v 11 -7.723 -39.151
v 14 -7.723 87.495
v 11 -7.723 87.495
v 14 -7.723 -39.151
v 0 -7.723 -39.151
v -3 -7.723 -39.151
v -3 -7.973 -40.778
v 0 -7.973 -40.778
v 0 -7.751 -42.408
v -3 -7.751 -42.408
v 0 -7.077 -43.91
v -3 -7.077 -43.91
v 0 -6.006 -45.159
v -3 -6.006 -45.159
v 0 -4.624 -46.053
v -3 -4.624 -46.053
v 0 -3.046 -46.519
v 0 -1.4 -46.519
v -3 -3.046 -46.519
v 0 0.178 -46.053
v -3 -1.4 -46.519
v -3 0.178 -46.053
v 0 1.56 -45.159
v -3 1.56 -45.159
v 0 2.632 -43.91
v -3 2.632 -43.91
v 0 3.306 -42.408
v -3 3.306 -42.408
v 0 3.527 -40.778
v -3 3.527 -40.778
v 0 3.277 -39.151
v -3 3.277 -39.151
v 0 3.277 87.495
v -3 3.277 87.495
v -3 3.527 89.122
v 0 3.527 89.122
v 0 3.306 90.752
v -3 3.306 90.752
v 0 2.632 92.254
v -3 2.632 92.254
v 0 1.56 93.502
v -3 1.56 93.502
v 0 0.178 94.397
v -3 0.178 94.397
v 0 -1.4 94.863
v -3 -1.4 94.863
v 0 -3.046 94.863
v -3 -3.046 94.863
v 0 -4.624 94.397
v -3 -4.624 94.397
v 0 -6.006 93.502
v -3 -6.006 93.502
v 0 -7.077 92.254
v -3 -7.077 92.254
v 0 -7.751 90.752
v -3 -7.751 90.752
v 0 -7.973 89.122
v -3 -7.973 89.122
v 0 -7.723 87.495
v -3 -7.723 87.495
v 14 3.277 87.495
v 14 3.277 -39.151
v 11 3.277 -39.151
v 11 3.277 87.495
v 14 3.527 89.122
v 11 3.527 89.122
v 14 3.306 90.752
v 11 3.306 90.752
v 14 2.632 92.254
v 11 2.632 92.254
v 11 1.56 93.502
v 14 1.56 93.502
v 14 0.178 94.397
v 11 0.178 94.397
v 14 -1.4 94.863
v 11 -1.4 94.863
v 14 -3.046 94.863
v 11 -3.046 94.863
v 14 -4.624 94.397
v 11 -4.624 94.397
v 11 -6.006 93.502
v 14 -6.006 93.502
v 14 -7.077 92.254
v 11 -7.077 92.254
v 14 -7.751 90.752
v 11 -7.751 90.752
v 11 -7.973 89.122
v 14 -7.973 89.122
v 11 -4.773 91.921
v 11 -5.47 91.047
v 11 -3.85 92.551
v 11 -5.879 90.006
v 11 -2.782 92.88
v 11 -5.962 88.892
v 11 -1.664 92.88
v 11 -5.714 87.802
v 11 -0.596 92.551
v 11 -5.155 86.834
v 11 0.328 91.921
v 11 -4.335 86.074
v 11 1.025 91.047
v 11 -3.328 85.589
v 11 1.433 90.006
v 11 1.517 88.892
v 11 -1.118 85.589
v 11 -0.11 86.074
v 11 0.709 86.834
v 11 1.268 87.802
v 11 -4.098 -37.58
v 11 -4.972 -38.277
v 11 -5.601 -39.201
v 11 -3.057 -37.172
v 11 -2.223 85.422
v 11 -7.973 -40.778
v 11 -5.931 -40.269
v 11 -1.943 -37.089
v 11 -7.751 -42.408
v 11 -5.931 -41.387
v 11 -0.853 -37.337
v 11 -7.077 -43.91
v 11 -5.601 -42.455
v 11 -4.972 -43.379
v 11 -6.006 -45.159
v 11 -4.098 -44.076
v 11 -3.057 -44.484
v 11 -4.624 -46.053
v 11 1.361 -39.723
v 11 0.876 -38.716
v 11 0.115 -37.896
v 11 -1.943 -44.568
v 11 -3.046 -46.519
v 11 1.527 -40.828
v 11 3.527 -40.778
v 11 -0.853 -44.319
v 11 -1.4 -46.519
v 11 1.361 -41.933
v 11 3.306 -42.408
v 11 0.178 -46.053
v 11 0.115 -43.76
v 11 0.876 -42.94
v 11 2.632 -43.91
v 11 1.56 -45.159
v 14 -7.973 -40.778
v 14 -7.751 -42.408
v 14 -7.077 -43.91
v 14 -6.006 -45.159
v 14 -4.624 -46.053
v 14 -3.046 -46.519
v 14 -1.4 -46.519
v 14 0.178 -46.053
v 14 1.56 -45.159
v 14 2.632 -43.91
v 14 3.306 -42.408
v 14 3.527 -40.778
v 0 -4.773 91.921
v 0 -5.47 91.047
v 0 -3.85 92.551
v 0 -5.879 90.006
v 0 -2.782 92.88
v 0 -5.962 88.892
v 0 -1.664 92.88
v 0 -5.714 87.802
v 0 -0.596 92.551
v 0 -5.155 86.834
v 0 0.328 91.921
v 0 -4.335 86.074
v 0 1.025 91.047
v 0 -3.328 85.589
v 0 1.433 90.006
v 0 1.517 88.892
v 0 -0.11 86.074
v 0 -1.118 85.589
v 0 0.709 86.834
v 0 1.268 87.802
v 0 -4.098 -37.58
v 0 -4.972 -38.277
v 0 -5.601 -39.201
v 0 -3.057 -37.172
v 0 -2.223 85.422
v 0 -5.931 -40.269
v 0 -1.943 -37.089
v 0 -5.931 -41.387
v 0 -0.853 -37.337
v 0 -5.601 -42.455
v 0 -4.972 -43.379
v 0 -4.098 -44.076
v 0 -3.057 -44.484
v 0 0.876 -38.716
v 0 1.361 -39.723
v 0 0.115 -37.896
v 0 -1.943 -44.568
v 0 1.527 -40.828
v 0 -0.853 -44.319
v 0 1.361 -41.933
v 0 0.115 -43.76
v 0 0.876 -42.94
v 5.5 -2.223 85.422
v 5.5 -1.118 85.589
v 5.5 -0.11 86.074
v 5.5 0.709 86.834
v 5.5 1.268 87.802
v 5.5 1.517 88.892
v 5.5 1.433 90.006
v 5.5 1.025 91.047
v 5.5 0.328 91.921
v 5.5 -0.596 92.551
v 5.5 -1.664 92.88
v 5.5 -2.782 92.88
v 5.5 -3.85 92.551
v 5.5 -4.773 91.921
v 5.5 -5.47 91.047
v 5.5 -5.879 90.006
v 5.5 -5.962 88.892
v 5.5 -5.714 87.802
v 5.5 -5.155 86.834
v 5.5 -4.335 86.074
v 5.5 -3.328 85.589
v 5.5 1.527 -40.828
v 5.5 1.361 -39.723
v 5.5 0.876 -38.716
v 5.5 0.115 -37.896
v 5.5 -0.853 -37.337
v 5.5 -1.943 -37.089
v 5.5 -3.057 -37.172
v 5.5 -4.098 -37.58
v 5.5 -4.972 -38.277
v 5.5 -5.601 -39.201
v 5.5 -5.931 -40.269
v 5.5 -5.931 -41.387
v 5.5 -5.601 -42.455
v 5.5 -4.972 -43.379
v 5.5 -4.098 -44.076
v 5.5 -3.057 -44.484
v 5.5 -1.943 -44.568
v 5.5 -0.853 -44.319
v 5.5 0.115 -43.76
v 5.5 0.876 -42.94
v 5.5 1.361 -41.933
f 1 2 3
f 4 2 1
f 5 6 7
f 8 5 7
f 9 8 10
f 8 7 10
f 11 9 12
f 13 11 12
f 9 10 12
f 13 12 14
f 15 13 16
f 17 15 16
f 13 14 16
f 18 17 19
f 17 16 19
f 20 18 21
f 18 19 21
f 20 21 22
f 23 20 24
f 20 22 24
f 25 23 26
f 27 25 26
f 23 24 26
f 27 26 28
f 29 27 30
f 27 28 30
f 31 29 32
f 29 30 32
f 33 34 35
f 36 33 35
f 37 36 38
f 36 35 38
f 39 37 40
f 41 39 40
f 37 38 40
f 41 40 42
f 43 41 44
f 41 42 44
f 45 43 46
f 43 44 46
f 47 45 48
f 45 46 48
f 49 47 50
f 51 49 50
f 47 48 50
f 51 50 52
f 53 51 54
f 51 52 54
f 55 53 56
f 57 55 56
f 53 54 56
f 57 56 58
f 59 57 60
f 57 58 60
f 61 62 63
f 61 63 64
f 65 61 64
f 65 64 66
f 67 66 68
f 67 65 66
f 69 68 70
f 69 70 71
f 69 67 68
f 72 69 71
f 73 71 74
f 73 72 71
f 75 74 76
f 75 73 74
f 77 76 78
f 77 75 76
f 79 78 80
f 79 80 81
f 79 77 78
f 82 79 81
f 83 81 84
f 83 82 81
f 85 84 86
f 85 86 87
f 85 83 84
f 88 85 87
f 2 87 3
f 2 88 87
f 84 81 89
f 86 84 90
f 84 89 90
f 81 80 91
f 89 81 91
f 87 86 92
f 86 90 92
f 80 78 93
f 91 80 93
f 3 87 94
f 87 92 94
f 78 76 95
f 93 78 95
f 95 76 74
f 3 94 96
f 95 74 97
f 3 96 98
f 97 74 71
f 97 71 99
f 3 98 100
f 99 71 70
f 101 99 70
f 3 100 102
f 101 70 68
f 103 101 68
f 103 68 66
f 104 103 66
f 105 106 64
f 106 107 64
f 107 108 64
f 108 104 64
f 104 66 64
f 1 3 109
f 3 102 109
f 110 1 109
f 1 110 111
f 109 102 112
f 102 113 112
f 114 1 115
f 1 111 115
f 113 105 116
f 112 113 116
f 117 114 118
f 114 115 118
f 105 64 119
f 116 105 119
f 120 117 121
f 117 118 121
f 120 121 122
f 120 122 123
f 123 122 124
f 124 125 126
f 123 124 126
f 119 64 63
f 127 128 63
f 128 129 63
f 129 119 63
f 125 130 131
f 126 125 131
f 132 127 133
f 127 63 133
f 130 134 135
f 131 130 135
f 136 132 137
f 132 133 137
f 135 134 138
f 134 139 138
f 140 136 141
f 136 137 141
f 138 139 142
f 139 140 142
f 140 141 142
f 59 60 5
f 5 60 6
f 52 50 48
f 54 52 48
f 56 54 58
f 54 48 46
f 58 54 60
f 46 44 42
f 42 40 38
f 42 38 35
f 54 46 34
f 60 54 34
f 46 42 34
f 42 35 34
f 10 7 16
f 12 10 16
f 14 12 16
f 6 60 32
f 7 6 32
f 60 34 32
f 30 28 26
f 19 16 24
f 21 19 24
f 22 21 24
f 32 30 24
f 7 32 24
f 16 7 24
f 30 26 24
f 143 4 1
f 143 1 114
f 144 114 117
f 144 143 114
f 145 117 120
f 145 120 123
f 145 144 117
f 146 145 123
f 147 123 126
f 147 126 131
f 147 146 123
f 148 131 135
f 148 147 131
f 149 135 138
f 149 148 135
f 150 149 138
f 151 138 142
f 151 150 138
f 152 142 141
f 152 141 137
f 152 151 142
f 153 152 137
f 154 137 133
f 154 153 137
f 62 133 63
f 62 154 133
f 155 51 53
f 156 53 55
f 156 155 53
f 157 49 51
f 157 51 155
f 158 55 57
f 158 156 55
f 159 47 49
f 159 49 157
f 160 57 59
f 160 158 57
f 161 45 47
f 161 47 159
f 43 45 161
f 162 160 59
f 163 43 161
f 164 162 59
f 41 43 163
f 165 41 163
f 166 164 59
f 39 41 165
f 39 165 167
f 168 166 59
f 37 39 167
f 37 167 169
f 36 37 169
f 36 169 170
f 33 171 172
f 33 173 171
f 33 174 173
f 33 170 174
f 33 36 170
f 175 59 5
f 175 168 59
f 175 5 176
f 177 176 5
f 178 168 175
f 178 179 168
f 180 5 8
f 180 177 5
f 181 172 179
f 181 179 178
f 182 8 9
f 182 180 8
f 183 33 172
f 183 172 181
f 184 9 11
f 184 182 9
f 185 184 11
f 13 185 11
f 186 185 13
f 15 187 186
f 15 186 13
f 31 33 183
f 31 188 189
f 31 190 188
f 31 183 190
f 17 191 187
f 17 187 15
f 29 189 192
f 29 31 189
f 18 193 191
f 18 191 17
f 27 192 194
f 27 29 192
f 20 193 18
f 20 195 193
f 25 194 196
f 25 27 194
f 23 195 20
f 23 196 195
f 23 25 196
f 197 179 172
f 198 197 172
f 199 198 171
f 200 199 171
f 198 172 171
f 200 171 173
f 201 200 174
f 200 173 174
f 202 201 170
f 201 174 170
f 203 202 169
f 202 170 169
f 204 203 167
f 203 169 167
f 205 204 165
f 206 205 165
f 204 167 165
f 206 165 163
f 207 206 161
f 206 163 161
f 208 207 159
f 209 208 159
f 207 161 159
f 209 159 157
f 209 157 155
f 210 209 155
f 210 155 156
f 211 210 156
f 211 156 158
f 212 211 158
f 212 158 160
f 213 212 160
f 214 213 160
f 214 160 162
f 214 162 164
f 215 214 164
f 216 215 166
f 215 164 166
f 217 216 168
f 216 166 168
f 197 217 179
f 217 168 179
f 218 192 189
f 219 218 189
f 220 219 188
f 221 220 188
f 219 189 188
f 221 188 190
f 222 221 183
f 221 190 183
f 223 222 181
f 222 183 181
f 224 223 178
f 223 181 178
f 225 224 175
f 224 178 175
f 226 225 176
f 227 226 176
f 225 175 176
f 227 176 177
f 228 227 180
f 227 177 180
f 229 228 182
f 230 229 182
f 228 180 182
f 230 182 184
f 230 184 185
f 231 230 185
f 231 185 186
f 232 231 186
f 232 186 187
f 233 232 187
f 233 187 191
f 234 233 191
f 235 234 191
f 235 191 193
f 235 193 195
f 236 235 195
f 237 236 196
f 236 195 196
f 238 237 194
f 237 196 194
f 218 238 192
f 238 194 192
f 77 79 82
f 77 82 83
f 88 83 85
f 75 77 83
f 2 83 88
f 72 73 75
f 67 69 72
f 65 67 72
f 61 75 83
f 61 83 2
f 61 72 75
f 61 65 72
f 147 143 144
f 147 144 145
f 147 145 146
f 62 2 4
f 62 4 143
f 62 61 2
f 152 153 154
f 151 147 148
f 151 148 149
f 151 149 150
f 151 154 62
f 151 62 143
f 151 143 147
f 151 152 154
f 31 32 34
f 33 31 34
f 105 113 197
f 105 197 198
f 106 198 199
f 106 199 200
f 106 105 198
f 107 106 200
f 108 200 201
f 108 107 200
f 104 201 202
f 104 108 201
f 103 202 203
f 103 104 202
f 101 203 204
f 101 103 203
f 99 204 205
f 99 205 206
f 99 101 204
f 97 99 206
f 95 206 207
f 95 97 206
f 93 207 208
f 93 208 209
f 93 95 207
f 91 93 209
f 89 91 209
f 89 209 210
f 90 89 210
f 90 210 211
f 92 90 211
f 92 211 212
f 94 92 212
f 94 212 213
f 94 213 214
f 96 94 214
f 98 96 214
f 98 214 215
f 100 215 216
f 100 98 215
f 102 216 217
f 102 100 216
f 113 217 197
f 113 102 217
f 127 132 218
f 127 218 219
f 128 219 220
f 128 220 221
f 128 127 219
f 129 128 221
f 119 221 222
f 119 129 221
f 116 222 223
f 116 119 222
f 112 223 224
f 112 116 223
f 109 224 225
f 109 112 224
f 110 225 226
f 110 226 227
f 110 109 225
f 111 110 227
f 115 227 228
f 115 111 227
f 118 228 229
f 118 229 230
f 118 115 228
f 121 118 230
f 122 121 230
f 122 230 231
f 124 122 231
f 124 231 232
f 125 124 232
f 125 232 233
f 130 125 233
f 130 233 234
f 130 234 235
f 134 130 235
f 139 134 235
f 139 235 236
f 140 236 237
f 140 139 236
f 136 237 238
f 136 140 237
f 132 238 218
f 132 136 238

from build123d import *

# Parameters (mm, degrees)
BOSS_EXTRUDE1_DEPTH = 5.5
BOSS_EXTRUDE3_START = -3
BOSS_EXTRUDE3_DEPTH = 3


with BuildPart() as part:
    # Sketch1 → Boss-Extrude1 (new body)
    with BuildSketch(Plane(origin=(0, 0, 0), x_dir=(0, 0, -1), z_dir=(1, 0, 0))):
        with BuildLine():
            Line((-89.1719550698585, -5.9728416814886485), (-89.1719550698585, -2.2228416814886414))
            Line((-89.1719550698585, -2.2228416814886414), (-89.1719550698585, 1.5271583185113649))
            ThreePointArc((-89.17195506985841, 1.5271583185113649), (-92.9219550698585, -2.2228416814886476), (-89.1719550698584, -5.972841681488648))
        make_face()
        with BuildLine():
            Line((40.82804493014197, 1.5271583185113649), (40.82804493014197, -2.2228416814886414))
            Line((40.82804493014197, -2.2228416814886414), (40.82804493014197, -5.9728416814886485))
            ThreePointArc((40.828044930142056, -5.972841681488648), (43.47969535959156, -4.874492110938169), (44.57804493014198, -2.2228416814886423))
            ThreePointArc((44.57804493014198, -2.2228416814886414), (43.47969535959156, 0.4288087479608862), (40.828044930142056, 1.5271583185113649))
        make_face()
        with BuildLine():
            ThreePointArc((40.828044930142056, 1.5271583185113649), (38.176394500692446, 0.42880874796094703), (37.078044930141964, -2.222841681488641))
            Line((37.07804493014196, -2.2228416814886414), (40.82804493014196, -2.2228416814886414))
            Line((40.82804493014197, -2.2228416814886414), (40.82804493014197, 1.5271583185113649))
        make_face()
        with BuildLine():
            Line((40.82804493014196, -2.2228416814886414), (37.07804493014196, -2.2228416814886414))
            ThreePointArc((37.078044930141964, -2.222841681488641), (38.176394500692446, -4.874492110938229), (40.828044930142056, -5.972841681488648))
            Line((40.82804493014197, -5.9728416814886485), (40.82804493014197, -2.2228416814886414))
        make_face()
        with BuildLine():
            Line((-89.1719550698585, 1.5271583185113649), (-89.1719550698585, -2.2228416814886414))
            Line((-89.1719550698585, -2.2228416814886414), (-85.4219550698585, -2.2228416814886414))
            ThreePointArc((-85.4219550698585, -2.2228416814886414), (-86.52030464040891, 0.4288087479608862), (-89.17195506985841, 1.5271583185113649))
        make_face()
        with BuildLine():
            Line((-85.4219550698585, -2.2228416814886414), (-89.1719550698585, -2.2228416814886414))
            Line((-89.1719550698585, -2.2228416814886414), (-89.1719550698585, -5.9728416814886485))
            ThreePointArc((-89.1719550698584, -5.972841681488648), (-86.52030464040891, -4.874492110938164), (-85.4219550698585, -2.2228416814886423))
        make_face()
    boss_extrude1 = extrude(amount=BOSS_EXTRUDE1_DEPTH)

    # Sketch1<4> → Boss-Extrude3 (add)
    with BuildSketch(Plane(origin=(0, 0, 0), x_dir=(0, 0, -1), z_dir=(1, 0, 0)).offset(BOSS_EXTRUDE3_START)):
        with BuildLine():
            Line((35.078044930141985, -2.2228416814886414), (-83.42195506985851, -2.2228416814886414))
            ThreePointArc((-83.42195506985851, -2.2228416814886427), (-84.55104914390795, -5.6447897266107425), (-87.49490408673329, -7.722841681488518))
            Line((-87.49490408673327, -7.722841681488641), (39.150993947017625, -7.722841681488641))
            ThreePointArc((39.1509939470176, -7.72284168148878), (36.207139004191674, -5.644789726611098), (35.07804493014198, -2.2228416814886405))
        make_face()
        with BuildLine():
            ThreePointArc((-87.49490408673329, 3.277158318511235), (-84.55104914390795, 1.1991063636334598), (-83.42195506985851, -2.2228416814886414))
            Line((-83.42195506985851, -2.2228416814886414), (35.078044930141985, -2.2228416814886414))
            ThreePointArc((35.07804493014198, -2.2228416814886405), (36.207139004191674, 1.1991063636338088), (39.150993947017575, 3.27715831851149))
            Line((39.1509939470176, 3.2771583185113586), (-87.49490408673327, 3.2771583185113586))
        make_face()
        with BuildLine():
            ThreePointArc((-89.17195506985841, 1.5271583185113649), (-86.52030464040891, 0.4288087479608862), (-85.4219550698585, -2.2228416814886414))
            Line((-85.4219550698585, -2.2228416814886414), (-83.42195506985851, -2.2228416814886414))
            ThreePointArc((-83.42195506985851, -2.2228416814886414), (-84.55104914390795, 1.1991063636334598), (-87.49490408673329, 3.277158318511235))
            Line((-87.49490408673327, 3.2771583185113586), (-89.1719550698585, 3.2771583185113586))
            Line((-89.1719550698585, 3.2771583185113586), (-89.1719550698585, 1.5271583185113649))
        make_face()
        with BuildLine():
            Line((-83.42195506985851, -2.2228416814886414), (-85.4219550698585, -2.2228416814886414))
            ThreePointArc((-85.4219550698585, -2.2228416814886423), (-86.52030464040891, -4.874492110938164), (-89.1719550698584, -5.972841681488648))
            Line((-89.1719550698585, -5.9728416814886485), (-89.1719550698585, -7.722841681488641))
            Line((-89.1719550698585, -7.722841681488641), (-87.49490408673327, -7.722841681488641))
            ThreePointArc((-87.49490408673329, -7.722841681488518), (-84.55104914390795, -5.6447897266107425), (-83.42195506985851, -2.2228416814886427))
        make_face()
        with BuildLine():
            Line((-89.1719550698585, -5.9728416814886485), (-89.1719550698585, -2.2228416814886414))
            Line((-89.1719550698585, -2.2228416814886414), (-89.1719550698585, 1.5271583185113649))
            ThreePointArc((-89.17195506985841, 1.5271583185113649), (-92.9219550698585, -2.2228416814886476), (-89.1719550698584, -5.972841681488648))
        make_face()
        with BuildLine():
            Line((-89.1719550698585, 1.5271583185113649), (-89.1719550698585, -2.2228416814886414))
            Line((-89.1719550698585, -2.2228416814886414), (-85.4219550698585, -2.2228416814886414))
            ThreePointArc((-85.4219550698585, -2.2228416814886414), (-86.52030464040891, 0.4288087479608862), (-89.17195506985841, 1.5271583185113649))
        make_face()
        with BuildLine():
            Line((-85.4219550698585, -2.2228416814886414), (-89.1719550698585, -2.2228416814886414))
            Line((-89.1719550698585, -2.2228416814886414), (-89.1719550698585, -5.9728416814886485))
            ThreePointArc((-89.1719550698584, -5.972841681488648), (-86.52030464040891, -4.874492110938164), (-85.4219550698585, -2.2228416814886423))
        make_face()
        with BuildLine():
            ThreePointArc((-89.1719550698584, -5.972841681488648), (-92.9219550698585, -2.2228416814886476), (-89.17195506985841, 1.5271583185113649))
            Line((-89.1719550698585, 1.5271583185113649), (-89.1719550698585, 3.2771583185113586))
            Line((-89.1719550698585, 3.2771583185113586), (-87.49490408673327, 3.2771583185113586))
            ThreePointArc((-87.49490408673329, 3.277158318511235), (-94.92195506985848, -2.2228416814886405), (-87.49490408673329, -7.722841681488518))
            Line((-87.49490408673327, -7.722841681488641), (-89.1719550698585, -7.722841681488641))
            Line((-89.1719550698585, -7.722841681488641), (-89.1719550698585, -5.9728416814886485))
        make_face()
        with BuildLine():
            Line((40.82804493014197, 1.5271583185113649), (40.82804493014197, -2.2228416814886414))
            Line((40.82804493014197, -2.2228416814886414), (40.82804493014197, -5.9728416814886485))
            ThreePointArc((40.828044930142056, -5.972841681488648), (43.47969535959156, -4.874492110938169), (44.57804493014198, -2.2228416814886423))
            ThreePointArc((44.57804493014198, -2.2228416814886414), (43.47969535959156, 0.4288087479608862), (40.828044930142056, 1.5271583185113649))
        make_face()
        with BuildLine():
            ThreePointArc((40.828044930142056, 1.5271583185113649), (38.176394500692446, 0.42880874796094703), (37.078044930141964, -2.222841681488641))
            Line((37.07804493014196, -2.2228416814886414), (40.82804493014196, -2.2228416814886414))
            Line((40.82804493014197, -2.2228416814886414), (40.82804493014197, 1.5271583185113649))
        make_face()
        with BuildLine():
            Line((40.82804493014196, -2.2228416814886414), (37.07804493014196, -2.2228416814886414))
            ThreePointArc((37.078044930141964, -2.222841681488641), (38.176394500692446, -4.874492110938229), (40.828044930142056, -5.972841681488648))
            Line((40.82804493014197, -5.9728416814886485), (40.82804493014197, -2.2228416814886414))
        make_face()
        with BuildLine():
            ThreePointArc((39.150993947017575, 3.27715831851149), (36.207139004191674, 1.1991063636338088), (35.07804493014198, -2.2228416814886405))
            Line((35.078044930141985, -2.2228416814886414), (37.07804493014196, -2.2228416814886414))
            ThreePointArc((37.078044930141964, -2.222841681488641), (38.176394500692446, 0.42880874796094703), (40.828044930142056, 1.5271583185113649))
            Line((40.82804493014197, 1.5271583185113649), (40.82804493014197, 3.2771583185113586))
            Line((40.82804493014196, 3.2771583185113586), (39.1509939470176, 3.2771583185113586))
        make_face()
        with BuildLine():
            ThreePointArc((46.578044930141964, -2.2228416814886414), (44.24999297526442, 2.3980642444616596), (39.150993947017575, 3.27715831851149))
            Line((39.1509939470176, 3.2771583185113586), (40.82804493014196, 3.2771583185113586))
            Line((40.82804493014197, 3.2771583185113586), (40.82804493014197, 1.5271583185113649))
            ThreePointArc((40.828044930142056, 1.5271583185113649), (43.47969535959156, 0.4288087479608862), (44.57804493014198, -2.2228416814886414))
            ThreePointArc((44.57804493014198, -2.2228416814886423), (43.47969535959156, -4.874492110938169), (40.828044930142056, -5.972841681488648))
            Line((40.82804493014197, -5.9728416814886485), (40.82804493014197, -7.722841681488641))
            Line((40.82804493014196, -7.722841681488641), (39.150993947017625, -7.722841681488641))
            ThreePointArc((39.1509939470176, -7.72284168148878), (44.249992975264426, -6.843747607438935), (46.578044930141964, -2.2228416814886427))
        make_face()
        with BuildLine():
            Line((37.07804493014196, -2.2228416814886414), (35.078044930141985, -2.2228416814886414))
            ThreePointArc((35.07804493014198, -2.2228416814886405), (36.207139004191674, -5.644789726611098), (39.1509939470176, -7.72284168148878))
            Line((39.150993947017625, -7.722841681488641), (40.82804493014196, -7.722841681488641))
            Line((40.82804493014197, -7.722841681488641), (40.82804493014197, -5.9728416814886485))
            ThreePointArc((40.828044930142056, -5.972841681488648), (38.176394500692446, -4.874492110938229), (37.078044930141964, -2.222841681488641))
        make_face()
    boss_extrude3 = extrude(amount=BOSS_EXTRUDE3_DEPTH)

    # Mirror1: Boss-Extrude1, Boss-Extrude3 across plane
    add(boss_extrude1.mirror(Plane(origin=(5.5, 0, 0), x_dir=(0, 0, 1), z_dir=(1, 0, 0))))
    add(boss_extrude3.mirror(Plane(origin=(5.5, 0, 0), x_dir=(0, 0, 1), z_dir=(1, 0, 0))))


solid = part.part
